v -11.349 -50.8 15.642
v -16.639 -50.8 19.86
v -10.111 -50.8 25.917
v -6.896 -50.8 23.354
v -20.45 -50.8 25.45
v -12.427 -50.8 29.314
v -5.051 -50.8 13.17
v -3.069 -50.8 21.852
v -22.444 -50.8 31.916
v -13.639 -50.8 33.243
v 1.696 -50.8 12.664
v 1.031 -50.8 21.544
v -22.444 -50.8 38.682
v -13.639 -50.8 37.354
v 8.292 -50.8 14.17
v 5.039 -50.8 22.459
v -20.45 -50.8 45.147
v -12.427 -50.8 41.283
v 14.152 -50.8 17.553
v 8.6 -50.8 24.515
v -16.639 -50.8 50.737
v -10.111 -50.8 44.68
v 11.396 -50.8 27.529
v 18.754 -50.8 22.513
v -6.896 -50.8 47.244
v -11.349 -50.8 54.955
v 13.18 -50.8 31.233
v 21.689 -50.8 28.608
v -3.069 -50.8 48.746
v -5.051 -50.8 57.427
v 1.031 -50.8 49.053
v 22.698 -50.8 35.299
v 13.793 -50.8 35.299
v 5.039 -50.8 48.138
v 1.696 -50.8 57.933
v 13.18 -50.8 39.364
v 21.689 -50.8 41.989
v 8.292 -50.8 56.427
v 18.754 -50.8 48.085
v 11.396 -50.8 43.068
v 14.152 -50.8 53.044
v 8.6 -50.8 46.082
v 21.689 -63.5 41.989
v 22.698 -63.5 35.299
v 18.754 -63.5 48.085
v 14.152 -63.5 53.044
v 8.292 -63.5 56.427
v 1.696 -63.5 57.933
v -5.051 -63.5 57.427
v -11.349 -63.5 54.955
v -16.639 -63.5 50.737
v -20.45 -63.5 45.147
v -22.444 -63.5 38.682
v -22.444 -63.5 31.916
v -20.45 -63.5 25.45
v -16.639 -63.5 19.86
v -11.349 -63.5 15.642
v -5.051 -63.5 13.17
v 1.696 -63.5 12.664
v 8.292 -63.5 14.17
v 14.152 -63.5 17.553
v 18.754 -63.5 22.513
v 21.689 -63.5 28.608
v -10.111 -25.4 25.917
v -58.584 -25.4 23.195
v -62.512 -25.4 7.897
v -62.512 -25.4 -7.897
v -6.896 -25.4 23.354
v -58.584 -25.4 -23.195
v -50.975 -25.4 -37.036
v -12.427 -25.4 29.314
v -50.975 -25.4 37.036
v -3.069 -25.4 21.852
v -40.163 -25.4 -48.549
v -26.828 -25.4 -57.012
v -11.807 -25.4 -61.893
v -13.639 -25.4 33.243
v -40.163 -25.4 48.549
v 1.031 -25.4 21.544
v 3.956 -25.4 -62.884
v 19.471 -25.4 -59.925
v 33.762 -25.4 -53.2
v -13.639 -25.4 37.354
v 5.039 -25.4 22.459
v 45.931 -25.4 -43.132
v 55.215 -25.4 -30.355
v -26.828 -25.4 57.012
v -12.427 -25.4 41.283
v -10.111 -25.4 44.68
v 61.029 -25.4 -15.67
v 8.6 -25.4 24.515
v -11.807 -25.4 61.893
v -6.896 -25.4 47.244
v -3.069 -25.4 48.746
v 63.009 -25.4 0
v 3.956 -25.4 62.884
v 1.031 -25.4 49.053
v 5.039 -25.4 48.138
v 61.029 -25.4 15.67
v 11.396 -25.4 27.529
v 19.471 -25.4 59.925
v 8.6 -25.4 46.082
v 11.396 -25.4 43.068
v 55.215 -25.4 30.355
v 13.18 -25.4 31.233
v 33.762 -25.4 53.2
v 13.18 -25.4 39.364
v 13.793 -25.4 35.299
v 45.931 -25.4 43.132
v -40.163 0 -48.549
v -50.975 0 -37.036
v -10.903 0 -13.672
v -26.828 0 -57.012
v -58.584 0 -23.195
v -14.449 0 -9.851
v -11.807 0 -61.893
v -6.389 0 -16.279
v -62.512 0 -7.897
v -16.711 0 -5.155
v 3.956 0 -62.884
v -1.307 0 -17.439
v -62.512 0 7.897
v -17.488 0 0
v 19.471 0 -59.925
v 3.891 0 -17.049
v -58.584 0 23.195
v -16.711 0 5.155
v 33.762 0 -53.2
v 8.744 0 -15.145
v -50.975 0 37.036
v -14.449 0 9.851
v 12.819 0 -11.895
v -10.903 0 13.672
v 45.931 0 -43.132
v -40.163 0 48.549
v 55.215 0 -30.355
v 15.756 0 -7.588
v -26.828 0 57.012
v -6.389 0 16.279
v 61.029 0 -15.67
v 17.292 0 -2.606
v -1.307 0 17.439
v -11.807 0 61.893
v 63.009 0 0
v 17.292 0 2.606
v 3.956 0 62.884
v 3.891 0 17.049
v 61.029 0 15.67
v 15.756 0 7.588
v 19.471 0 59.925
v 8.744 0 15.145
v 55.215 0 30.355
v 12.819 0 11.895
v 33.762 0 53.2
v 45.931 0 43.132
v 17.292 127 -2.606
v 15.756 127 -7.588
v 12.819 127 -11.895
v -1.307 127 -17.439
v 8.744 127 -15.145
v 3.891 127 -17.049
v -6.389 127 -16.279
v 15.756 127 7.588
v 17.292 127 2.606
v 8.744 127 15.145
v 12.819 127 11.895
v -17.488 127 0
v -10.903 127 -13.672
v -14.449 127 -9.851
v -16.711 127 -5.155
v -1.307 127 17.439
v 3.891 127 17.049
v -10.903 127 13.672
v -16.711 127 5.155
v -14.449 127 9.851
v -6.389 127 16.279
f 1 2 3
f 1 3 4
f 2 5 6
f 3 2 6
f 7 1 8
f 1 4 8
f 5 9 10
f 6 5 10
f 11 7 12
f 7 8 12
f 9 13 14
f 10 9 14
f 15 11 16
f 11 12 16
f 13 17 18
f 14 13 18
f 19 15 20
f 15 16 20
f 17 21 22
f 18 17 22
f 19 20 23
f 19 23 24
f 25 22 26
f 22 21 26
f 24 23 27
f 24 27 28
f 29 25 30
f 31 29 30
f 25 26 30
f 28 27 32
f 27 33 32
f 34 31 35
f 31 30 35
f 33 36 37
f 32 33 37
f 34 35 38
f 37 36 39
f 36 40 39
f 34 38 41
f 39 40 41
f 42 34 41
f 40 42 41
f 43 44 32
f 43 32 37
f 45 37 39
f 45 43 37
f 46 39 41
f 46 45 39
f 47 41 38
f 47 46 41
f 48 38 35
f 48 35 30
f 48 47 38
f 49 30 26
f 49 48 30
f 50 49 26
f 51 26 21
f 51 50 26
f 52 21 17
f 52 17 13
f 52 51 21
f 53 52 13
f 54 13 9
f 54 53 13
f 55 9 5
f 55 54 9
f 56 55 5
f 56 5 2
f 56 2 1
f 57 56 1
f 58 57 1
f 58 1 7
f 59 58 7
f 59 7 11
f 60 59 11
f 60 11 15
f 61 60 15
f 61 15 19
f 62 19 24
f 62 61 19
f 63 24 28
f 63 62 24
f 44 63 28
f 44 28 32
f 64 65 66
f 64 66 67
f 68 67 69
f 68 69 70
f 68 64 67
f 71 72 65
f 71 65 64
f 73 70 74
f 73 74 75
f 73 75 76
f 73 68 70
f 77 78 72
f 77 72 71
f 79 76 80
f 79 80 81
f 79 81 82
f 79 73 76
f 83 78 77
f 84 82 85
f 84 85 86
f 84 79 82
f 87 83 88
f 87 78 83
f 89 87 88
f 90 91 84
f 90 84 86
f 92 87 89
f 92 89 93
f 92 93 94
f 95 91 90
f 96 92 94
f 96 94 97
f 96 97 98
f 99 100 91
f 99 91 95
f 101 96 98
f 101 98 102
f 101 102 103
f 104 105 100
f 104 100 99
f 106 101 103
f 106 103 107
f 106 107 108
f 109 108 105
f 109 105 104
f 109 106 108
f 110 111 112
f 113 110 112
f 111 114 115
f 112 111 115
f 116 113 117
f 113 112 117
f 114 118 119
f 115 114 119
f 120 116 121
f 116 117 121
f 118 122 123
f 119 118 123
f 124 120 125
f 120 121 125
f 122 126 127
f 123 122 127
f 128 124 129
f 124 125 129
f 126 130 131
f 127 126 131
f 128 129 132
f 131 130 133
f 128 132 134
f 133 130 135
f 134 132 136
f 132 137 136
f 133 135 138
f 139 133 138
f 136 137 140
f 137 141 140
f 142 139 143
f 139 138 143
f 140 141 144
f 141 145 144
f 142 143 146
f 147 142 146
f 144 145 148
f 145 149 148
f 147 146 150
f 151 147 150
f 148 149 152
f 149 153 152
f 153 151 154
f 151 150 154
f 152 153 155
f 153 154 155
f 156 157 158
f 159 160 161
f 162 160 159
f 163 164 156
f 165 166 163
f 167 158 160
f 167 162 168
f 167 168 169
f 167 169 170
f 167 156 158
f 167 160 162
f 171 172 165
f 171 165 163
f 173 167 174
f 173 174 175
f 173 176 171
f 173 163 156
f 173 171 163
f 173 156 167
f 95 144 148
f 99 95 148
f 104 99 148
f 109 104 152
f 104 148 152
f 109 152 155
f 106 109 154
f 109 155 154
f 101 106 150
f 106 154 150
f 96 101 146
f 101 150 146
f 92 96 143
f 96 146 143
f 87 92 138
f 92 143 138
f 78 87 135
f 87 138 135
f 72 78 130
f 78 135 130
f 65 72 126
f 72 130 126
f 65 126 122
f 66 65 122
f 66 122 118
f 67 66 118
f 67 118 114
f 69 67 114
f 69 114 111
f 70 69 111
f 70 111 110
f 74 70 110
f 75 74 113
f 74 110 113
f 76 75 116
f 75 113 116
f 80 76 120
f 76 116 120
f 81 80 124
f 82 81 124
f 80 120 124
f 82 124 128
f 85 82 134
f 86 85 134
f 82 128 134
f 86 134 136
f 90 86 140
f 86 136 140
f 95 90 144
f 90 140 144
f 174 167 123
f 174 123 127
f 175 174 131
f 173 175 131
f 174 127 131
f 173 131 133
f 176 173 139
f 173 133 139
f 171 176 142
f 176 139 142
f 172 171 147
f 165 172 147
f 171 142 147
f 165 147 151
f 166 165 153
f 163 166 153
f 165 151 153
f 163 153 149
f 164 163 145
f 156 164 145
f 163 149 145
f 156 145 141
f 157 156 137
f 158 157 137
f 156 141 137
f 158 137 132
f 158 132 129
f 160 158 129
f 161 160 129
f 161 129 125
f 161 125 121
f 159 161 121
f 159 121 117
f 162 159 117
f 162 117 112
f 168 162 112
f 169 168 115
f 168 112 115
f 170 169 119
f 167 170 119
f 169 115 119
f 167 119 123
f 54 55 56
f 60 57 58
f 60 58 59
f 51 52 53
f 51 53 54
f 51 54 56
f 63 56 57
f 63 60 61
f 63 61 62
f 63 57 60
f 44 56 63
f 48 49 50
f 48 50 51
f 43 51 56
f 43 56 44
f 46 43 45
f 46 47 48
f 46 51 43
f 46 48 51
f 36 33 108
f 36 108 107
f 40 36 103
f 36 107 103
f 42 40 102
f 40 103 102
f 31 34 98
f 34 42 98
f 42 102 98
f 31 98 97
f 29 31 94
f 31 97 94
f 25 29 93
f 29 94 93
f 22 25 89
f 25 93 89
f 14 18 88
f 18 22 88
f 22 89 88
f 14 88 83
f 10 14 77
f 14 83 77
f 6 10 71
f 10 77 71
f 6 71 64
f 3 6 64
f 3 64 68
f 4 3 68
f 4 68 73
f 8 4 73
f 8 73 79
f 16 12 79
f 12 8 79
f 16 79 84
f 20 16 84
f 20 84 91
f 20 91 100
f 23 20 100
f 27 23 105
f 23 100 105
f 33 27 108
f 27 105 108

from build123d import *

# Parameters (mm, degrees)
F0_R     = 63.008602
F1_DEPTH = 25.4
F2_R     = 13.792903
F3_DEPTH = 63.5
F4_R     = 22.697716
F5_DEPTH = 12.7
F6_R     = 17.487641
F7_DEPTH = 127


with BuildPart() as f1:
    # F0 (on Front) → F1 (new body)
    with BuildSketch(Plane.XZ):
        Circle(F0_R)
    extrude(amount=F1_DEPTH)

    # F2 (on Front) → F3 (join)
    with BuildSketch(Plane.XZ):
        with Locations((0, 35.29866)):
            Circle(F2_R)
    extrude(amount=F3_DEPTH)

    # F4 (on face) → F5 (join)
    with BuildSketch(Plane.XZ.offset(63.5)):
        with Locations((0, 35.29866)):
            Circle(F4_R)
    extrude(amount=-F5_DEPTH)

    # F6 (on face) → F7 (join)
    with BuildSketch(Plane(origin=(0, 0, 0), x_dir=(-1, 0, 0), z_dir=(0, 1, 0))):
        Circle(F6_R)
    extrude(amount=F7_DEPTH)


solid = f1.part
